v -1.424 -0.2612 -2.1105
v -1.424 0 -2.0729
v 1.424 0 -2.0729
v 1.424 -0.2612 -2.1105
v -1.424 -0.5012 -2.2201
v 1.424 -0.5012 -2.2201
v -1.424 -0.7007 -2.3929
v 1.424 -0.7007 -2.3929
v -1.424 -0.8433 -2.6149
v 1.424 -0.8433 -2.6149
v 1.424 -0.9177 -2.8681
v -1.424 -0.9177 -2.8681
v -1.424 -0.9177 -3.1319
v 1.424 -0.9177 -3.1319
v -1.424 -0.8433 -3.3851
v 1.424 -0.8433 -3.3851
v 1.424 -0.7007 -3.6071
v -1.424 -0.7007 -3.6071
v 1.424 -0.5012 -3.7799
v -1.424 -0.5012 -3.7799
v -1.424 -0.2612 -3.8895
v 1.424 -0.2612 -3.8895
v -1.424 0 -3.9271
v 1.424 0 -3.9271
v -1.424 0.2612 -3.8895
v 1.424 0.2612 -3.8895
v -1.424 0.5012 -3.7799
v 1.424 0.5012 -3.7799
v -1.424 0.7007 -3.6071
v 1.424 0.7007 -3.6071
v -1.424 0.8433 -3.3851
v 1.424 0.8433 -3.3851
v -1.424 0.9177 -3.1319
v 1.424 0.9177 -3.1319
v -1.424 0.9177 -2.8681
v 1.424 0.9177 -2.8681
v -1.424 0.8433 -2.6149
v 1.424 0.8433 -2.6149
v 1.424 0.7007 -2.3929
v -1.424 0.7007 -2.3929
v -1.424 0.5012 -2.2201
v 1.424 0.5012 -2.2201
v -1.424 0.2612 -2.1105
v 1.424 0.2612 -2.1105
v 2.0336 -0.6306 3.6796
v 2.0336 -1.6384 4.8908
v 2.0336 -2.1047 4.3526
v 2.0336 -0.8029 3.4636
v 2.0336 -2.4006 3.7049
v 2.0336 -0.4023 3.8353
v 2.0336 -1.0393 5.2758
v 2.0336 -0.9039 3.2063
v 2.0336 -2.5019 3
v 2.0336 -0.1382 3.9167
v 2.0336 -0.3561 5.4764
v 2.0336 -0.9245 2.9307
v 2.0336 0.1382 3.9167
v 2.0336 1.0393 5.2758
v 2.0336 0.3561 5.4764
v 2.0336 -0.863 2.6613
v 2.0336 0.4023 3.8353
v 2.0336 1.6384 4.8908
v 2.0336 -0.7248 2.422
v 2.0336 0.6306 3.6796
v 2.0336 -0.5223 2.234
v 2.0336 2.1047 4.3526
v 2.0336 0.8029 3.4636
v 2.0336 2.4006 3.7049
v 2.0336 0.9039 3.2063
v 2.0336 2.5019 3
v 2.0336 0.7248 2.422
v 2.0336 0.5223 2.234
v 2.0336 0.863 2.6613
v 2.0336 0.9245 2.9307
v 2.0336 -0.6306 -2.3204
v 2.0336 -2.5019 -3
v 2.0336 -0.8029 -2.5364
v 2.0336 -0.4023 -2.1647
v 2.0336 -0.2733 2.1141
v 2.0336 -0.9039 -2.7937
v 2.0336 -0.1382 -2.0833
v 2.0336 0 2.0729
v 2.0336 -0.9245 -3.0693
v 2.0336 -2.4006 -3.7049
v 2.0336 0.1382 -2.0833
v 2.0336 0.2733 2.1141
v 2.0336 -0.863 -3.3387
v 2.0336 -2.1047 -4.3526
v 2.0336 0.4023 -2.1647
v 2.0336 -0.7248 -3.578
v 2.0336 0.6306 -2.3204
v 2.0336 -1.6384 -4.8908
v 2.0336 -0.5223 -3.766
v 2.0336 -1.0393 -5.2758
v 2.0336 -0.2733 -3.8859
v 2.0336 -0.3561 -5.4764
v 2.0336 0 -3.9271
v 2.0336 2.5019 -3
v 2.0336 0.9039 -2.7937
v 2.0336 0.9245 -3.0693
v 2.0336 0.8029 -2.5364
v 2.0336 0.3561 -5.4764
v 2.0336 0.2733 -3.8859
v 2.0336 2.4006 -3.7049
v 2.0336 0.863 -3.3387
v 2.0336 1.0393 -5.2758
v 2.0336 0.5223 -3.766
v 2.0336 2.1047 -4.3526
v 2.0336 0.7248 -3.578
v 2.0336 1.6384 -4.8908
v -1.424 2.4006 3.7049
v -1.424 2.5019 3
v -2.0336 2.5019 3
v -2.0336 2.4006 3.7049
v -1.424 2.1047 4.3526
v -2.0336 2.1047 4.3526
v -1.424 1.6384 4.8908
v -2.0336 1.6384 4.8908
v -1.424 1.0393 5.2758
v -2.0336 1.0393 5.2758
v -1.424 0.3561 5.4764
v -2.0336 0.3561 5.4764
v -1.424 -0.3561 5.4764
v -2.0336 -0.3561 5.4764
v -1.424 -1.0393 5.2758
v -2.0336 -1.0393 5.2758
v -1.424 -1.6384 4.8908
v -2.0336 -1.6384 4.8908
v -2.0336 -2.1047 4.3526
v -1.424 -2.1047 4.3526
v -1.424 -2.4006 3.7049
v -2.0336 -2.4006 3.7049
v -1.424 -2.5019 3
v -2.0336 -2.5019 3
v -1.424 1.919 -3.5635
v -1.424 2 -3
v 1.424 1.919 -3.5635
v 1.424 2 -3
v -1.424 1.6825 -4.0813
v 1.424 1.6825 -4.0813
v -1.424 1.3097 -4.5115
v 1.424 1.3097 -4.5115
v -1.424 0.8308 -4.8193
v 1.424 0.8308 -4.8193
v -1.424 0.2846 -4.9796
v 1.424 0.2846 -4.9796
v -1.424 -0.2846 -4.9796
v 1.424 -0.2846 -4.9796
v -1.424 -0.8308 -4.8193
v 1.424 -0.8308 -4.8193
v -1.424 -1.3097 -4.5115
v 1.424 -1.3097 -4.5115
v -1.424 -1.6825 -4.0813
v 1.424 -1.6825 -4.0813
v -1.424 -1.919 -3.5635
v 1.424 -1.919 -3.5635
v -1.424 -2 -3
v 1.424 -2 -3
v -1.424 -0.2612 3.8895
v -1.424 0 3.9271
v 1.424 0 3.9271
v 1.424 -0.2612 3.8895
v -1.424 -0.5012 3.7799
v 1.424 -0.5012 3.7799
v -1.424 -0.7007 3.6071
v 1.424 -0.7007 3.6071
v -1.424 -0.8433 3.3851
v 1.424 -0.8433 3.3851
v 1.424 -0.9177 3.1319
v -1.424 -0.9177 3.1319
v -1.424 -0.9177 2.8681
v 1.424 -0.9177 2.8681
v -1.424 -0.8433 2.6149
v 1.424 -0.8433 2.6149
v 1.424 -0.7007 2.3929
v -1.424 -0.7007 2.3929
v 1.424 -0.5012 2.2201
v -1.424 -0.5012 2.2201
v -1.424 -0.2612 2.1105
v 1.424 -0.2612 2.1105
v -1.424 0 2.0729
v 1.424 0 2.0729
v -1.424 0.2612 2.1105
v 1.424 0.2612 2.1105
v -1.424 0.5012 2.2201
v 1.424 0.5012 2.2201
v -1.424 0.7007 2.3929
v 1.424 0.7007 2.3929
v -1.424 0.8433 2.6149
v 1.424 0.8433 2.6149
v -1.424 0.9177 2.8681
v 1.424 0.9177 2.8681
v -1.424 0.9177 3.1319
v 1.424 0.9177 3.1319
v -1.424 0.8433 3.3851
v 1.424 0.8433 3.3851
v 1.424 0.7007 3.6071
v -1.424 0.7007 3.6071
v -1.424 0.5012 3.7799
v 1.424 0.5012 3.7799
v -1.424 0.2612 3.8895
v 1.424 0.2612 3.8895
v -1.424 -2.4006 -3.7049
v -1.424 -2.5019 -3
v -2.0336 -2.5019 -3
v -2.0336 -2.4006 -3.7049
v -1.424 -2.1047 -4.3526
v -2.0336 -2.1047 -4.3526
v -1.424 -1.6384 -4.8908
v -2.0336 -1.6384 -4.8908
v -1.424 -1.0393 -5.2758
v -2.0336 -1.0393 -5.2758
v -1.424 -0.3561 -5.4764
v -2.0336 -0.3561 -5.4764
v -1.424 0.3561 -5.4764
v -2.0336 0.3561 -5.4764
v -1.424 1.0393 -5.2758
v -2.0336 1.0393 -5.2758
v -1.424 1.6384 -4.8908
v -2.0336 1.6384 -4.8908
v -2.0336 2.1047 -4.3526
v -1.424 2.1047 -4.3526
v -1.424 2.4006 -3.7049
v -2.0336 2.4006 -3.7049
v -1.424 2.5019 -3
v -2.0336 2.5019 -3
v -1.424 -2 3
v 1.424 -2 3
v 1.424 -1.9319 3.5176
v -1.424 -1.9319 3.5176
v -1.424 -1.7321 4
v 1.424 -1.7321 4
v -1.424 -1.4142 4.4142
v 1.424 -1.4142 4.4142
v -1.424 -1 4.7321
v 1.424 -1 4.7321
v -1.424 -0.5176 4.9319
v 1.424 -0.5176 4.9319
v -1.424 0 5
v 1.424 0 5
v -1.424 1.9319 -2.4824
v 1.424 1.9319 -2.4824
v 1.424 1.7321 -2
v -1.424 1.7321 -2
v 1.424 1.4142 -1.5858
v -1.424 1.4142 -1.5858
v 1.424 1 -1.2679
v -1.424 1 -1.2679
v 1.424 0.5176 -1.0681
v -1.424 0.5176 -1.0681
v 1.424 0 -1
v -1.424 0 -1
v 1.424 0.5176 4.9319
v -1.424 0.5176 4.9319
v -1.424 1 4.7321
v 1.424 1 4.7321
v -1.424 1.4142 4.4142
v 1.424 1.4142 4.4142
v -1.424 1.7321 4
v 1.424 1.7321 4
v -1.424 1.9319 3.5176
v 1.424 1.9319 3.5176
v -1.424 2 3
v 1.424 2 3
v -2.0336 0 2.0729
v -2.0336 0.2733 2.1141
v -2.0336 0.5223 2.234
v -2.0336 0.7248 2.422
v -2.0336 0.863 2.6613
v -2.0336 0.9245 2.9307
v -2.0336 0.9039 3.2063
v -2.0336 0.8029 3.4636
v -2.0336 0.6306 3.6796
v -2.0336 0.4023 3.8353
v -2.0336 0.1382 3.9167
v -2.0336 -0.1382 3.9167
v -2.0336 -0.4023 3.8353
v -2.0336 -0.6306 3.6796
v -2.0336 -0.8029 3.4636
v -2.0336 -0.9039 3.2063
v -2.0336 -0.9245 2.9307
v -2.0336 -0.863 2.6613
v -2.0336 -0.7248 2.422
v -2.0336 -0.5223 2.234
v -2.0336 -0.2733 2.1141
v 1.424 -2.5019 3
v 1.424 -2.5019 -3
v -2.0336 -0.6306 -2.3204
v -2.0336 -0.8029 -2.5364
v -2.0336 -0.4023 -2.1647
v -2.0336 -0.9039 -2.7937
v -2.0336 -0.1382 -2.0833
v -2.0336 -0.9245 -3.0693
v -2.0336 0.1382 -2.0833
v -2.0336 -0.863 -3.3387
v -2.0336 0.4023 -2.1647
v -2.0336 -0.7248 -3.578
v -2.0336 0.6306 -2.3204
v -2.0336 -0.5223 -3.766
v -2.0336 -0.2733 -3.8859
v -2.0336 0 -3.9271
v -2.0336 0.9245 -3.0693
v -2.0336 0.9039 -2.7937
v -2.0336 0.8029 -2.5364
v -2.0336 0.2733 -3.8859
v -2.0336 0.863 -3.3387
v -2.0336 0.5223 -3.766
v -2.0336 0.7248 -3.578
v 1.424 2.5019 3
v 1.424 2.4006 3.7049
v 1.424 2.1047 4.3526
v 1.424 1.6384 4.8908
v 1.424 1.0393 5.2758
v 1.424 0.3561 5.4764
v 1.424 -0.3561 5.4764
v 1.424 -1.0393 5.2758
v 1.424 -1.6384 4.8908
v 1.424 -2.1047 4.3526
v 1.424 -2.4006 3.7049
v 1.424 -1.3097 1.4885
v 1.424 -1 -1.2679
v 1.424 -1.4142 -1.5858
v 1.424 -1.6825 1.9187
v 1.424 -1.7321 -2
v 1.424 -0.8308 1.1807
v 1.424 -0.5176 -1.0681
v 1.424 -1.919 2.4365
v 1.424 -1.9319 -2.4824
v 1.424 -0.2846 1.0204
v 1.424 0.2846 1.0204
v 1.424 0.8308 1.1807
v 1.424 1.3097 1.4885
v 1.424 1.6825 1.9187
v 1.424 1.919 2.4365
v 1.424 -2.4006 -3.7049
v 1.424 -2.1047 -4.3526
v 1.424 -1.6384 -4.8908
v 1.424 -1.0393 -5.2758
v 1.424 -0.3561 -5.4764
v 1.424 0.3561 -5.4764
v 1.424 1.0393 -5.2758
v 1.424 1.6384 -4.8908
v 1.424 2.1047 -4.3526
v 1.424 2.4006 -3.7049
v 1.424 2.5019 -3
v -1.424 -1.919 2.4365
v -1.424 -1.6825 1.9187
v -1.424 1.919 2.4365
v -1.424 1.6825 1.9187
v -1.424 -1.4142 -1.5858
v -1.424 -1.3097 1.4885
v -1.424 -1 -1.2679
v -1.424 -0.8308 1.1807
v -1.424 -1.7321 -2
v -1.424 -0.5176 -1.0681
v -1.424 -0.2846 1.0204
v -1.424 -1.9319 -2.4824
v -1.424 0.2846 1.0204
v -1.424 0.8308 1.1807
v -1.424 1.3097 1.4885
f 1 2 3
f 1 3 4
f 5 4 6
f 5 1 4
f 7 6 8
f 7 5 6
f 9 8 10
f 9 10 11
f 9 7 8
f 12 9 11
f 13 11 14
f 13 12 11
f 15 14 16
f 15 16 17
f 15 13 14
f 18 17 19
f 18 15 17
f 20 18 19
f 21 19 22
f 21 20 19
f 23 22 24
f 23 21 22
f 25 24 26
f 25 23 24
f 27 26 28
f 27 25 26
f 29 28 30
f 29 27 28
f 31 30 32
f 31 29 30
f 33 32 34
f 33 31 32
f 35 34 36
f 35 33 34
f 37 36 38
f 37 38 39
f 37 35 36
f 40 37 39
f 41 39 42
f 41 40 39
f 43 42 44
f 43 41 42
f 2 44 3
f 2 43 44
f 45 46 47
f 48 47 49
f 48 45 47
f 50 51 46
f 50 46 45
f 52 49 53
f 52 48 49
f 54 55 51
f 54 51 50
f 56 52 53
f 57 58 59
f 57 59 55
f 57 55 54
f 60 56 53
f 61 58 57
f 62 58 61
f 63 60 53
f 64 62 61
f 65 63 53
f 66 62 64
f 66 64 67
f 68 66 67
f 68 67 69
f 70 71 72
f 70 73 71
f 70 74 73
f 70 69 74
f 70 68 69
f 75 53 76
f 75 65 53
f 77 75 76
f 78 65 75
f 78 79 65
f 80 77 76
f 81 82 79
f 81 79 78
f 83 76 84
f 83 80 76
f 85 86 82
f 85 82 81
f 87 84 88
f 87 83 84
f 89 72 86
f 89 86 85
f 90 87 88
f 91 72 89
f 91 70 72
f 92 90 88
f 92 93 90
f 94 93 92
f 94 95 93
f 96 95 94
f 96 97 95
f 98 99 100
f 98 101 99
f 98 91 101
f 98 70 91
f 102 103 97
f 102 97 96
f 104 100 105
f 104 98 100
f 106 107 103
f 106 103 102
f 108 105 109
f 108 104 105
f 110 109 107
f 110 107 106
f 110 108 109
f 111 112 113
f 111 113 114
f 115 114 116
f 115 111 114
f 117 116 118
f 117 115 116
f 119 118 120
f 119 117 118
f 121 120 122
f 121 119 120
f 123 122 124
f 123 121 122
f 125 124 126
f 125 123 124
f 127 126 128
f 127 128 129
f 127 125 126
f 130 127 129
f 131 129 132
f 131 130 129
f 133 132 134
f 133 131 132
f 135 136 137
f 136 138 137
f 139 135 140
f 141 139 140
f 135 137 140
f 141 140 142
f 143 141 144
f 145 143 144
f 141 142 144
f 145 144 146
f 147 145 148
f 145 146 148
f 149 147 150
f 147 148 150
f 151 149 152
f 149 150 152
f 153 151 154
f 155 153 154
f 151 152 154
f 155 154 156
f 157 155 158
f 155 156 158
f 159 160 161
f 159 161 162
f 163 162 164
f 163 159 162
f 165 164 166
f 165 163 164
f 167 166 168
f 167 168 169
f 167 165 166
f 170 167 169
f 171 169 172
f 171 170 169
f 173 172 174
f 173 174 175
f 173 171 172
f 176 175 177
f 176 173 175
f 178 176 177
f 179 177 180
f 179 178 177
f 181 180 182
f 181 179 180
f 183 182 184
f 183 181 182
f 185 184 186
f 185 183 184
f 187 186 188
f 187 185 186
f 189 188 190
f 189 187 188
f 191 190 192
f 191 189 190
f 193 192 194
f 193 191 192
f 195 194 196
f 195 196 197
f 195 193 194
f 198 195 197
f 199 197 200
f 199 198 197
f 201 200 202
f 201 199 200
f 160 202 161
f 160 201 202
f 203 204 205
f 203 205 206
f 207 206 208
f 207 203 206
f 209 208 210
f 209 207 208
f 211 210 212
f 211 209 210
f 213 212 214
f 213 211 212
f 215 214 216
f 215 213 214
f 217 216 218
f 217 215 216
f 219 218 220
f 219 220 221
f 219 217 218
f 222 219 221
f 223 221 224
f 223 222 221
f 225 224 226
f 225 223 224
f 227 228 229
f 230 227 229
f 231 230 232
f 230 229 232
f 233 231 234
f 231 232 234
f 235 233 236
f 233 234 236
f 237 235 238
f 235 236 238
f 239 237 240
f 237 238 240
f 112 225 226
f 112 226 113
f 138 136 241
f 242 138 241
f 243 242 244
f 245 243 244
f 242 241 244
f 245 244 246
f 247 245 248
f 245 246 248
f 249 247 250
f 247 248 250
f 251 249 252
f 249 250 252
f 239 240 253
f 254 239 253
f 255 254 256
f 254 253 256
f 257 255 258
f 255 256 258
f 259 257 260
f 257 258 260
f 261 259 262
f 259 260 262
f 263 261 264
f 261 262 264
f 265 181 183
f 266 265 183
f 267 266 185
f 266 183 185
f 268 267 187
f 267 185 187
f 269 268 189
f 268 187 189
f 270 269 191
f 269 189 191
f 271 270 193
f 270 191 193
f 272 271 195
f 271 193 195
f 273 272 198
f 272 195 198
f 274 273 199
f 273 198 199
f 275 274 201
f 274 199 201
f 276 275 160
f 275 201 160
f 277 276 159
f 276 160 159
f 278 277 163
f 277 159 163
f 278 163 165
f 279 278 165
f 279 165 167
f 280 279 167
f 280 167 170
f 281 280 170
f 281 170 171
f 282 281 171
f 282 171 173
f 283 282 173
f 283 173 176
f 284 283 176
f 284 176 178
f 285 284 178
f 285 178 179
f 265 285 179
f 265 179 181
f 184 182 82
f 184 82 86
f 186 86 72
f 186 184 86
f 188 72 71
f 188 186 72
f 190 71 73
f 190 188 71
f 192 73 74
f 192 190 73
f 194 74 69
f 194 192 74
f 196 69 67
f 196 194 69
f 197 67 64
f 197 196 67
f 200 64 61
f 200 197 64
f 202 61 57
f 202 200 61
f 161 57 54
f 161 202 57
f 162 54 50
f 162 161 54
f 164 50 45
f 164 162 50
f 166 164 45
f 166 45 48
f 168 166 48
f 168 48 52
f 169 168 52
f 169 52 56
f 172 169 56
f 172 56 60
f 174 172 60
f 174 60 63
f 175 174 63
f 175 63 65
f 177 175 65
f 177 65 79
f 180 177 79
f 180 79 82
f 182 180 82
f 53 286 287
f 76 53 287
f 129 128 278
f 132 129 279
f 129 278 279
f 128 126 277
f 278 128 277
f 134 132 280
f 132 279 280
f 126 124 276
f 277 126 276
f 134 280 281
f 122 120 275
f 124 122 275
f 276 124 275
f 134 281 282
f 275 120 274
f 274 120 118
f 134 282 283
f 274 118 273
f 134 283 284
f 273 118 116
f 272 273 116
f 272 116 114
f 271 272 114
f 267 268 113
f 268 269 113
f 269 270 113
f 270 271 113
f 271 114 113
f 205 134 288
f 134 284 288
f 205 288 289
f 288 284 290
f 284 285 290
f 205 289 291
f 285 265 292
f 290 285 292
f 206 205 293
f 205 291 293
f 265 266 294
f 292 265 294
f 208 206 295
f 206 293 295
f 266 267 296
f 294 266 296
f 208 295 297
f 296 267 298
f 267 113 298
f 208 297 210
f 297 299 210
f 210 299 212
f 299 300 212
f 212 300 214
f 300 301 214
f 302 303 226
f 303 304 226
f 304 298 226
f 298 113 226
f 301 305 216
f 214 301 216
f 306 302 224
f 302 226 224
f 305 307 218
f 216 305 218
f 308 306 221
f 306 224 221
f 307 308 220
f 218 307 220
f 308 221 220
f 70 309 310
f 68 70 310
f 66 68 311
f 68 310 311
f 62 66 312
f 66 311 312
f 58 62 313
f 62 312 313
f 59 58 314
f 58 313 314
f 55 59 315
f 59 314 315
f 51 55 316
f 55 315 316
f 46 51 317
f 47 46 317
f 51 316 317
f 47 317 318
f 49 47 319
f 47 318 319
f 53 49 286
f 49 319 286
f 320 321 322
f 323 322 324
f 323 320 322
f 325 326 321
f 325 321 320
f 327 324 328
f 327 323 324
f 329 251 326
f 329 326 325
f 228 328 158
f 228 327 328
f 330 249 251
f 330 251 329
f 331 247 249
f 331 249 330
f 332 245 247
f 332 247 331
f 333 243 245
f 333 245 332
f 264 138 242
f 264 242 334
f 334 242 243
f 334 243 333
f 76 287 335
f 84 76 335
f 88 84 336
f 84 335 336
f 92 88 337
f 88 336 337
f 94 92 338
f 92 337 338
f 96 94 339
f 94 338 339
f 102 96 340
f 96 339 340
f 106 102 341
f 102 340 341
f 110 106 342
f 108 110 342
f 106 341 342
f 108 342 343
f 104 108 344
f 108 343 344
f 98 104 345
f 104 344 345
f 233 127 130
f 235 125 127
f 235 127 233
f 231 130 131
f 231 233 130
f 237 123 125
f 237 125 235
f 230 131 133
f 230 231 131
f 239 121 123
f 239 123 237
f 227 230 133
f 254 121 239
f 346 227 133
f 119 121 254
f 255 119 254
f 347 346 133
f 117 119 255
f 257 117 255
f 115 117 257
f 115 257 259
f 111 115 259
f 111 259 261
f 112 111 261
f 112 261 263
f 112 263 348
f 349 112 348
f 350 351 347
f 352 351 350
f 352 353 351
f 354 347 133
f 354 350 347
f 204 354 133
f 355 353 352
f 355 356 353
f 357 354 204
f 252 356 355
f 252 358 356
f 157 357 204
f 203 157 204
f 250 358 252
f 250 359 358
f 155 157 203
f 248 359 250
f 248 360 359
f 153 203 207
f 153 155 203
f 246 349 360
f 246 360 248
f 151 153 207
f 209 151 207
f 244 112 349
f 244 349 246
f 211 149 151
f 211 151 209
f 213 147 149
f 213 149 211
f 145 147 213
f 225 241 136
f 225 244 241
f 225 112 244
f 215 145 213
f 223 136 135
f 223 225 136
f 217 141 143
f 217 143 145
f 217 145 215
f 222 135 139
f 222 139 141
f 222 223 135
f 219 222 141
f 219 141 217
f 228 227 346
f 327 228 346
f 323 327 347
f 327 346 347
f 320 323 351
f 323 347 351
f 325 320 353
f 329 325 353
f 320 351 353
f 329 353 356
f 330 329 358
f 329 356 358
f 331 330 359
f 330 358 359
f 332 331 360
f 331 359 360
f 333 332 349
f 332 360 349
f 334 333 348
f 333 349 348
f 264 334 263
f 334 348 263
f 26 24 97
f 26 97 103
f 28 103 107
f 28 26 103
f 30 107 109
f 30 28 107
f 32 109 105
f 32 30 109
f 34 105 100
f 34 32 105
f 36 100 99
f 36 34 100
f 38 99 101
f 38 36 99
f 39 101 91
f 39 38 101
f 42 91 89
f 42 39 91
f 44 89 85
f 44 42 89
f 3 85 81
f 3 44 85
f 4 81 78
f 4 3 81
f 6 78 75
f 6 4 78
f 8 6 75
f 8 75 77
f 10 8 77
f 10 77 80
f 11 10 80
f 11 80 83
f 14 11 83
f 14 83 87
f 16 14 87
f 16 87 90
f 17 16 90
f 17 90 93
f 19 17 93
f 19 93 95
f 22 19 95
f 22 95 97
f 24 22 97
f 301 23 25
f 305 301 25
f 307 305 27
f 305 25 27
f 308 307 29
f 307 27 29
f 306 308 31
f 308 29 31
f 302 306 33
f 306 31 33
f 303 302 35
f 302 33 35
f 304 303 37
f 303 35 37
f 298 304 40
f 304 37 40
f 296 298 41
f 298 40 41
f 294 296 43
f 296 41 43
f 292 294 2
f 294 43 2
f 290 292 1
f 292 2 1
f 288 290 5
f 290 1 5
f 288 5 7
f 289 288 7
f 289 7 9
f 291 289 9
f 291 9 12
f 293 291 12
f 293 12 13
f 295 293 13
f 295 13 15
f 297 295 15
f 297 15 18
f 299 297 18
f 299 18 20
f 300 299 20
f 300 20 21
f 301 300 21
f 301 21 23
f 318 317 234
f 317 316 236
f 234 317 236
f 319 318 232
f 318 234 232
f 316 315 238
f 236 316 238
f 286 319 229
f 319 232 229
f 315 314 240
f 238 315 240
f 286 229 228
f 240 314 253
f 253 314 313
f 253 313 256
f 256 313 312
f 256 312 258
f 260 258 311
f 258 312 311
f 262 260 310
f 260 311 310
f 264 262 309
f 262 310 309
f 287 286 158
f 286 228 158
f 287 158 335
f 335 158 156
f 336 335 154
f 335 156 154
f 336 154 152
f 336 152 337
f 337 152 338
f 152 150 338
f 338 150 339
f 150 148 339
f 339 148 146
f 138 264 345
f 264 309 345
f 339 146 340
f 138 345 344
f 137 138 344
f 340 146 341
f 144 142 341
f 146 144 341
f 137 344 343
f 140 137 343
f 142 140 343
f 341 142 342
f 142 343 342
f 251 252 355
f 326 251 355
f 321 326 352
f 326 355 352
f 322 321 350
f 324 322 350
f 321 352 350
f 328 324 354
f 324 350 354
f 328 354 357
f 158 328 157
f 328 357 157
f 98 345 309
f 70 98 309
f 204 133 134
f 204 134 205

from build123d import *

# Parameters (mm, degrees)
SKETCH1_R               = 0.9271
BOSS_EXTRUDE1_DEPTH     = 1.424
BOSS_EXTRUDE2_OUTLINE_R = 0.9271
BOSS_EXTRUDE2_DEPTH     = 0.6096
CUT_EXTRUDE2_START      = -1.424
SKETCH3_R               = 2
CUT_EXTRUDE2_DEPTH      = 2.848


# Read off the part's stored shape, not the designer's step: Boss-Extrude2
with BuildPart() as part:
    # Sketch1 → Boss-Extrude1 (new, symmetric)
    with BuildSketch(Plane(origin=(0, 0, 0), x_dir=(0, 0, -1), z_dir=(1, 0, 0))):
        with BuildLine():
            Line((-3, 2), (3, 2))
            ThreePointArc((3, 2), (5, 0), (3, -2))
            Line((3, -2), (-3, -2))
            ThreePointArc((-3, -2), (-5, 0), (-3, 2))
        make_face()
        with Locations(Location((-3, 0, 0), (0, 0, 180))):
            Circle(SKETCH1_R, mode=Mode.SUBTRACT)
        with Locations(Location((3, 0, 0), (0, 0, 180))):
            Circle(SKETCH1_R, mode=Mode.SUBTRACT)
    extrude(amount=BOSS_EXTRUDE1_DEPTH, both=True)

    # Boss-Extrude2 outline → Boss-Extrude2 (add)
    with BuildSketch(Plane(origin=(1.424, 0, 0), x_dir=(0, 0, -1), z_dir=(1, 0, 0))):
        with BuildLine():
            Line((-3, -2.5019), (3, -2.5019))
            ThreePointArc((3, -2.5019), (5.5019, 0), (3, 2.5019))
            Line((3, 2.5019), (-3, 2.5019))
            ThreePointArc((-3, 2.5019), (-5.5019, 0), (-3, -2.5019))
        make_face()
        with Locations((-3, 0)):
            Circle(BOSS_EXTRUDE2_OUTLINE_R, mode=Mode.SUBTRACT)
        with Locations((3, 0)):
            Circle(BOSS_EXTRUDE2_OUTLINE_R, mode=Mode.SUBTRACT)
    boss_extrude2 = extrude(amount=BOSS_EXTRUDE2_DEPTH)

    # Mirror1: Boss-Extrude2 across plane
    add(boss_extrude2.mirror(Plane(origin=(0, 0, 0), x_dir=(0, 0, 1), z_dir=(1, 0, 0))))

    # Sketch3 → Cut-Extrude2 (cut)
    with BuildSketch(Plane(origin=(0, 0, 0), x_dir=(0, 0, -1), z_dir=(1, 0, 0)).offset(CUT_EXTRUDE2_START)):
        with BuildLine():
            Line((-3, 2.5019), (3, 2.5019))
            ThreePointArc((3, 2.5019), (5.5019, 0), (3, -2.5019))
            Line((3, -2.5019), (-3, -2.5019))
            ThreePointArc((-3, -2.5019), (-5.5019, 0), (-3, 2.5019))
        make_face()
        with Locations(Location((-3, 0, 0), (0, 0, 180))):
            Circle(SKETCH3_R, mode=Mode.SUBTRACT)
        with Locations(Location((3, 0, 0), (0, 0, 180))):
            Circle(SKETCH3_R, mode=Mode.SUBTRACT)
    extrude(amount=CUT_EXTRUDE2_DEPTH, mode=Mode.SUBTRACT)


solid = part.part
